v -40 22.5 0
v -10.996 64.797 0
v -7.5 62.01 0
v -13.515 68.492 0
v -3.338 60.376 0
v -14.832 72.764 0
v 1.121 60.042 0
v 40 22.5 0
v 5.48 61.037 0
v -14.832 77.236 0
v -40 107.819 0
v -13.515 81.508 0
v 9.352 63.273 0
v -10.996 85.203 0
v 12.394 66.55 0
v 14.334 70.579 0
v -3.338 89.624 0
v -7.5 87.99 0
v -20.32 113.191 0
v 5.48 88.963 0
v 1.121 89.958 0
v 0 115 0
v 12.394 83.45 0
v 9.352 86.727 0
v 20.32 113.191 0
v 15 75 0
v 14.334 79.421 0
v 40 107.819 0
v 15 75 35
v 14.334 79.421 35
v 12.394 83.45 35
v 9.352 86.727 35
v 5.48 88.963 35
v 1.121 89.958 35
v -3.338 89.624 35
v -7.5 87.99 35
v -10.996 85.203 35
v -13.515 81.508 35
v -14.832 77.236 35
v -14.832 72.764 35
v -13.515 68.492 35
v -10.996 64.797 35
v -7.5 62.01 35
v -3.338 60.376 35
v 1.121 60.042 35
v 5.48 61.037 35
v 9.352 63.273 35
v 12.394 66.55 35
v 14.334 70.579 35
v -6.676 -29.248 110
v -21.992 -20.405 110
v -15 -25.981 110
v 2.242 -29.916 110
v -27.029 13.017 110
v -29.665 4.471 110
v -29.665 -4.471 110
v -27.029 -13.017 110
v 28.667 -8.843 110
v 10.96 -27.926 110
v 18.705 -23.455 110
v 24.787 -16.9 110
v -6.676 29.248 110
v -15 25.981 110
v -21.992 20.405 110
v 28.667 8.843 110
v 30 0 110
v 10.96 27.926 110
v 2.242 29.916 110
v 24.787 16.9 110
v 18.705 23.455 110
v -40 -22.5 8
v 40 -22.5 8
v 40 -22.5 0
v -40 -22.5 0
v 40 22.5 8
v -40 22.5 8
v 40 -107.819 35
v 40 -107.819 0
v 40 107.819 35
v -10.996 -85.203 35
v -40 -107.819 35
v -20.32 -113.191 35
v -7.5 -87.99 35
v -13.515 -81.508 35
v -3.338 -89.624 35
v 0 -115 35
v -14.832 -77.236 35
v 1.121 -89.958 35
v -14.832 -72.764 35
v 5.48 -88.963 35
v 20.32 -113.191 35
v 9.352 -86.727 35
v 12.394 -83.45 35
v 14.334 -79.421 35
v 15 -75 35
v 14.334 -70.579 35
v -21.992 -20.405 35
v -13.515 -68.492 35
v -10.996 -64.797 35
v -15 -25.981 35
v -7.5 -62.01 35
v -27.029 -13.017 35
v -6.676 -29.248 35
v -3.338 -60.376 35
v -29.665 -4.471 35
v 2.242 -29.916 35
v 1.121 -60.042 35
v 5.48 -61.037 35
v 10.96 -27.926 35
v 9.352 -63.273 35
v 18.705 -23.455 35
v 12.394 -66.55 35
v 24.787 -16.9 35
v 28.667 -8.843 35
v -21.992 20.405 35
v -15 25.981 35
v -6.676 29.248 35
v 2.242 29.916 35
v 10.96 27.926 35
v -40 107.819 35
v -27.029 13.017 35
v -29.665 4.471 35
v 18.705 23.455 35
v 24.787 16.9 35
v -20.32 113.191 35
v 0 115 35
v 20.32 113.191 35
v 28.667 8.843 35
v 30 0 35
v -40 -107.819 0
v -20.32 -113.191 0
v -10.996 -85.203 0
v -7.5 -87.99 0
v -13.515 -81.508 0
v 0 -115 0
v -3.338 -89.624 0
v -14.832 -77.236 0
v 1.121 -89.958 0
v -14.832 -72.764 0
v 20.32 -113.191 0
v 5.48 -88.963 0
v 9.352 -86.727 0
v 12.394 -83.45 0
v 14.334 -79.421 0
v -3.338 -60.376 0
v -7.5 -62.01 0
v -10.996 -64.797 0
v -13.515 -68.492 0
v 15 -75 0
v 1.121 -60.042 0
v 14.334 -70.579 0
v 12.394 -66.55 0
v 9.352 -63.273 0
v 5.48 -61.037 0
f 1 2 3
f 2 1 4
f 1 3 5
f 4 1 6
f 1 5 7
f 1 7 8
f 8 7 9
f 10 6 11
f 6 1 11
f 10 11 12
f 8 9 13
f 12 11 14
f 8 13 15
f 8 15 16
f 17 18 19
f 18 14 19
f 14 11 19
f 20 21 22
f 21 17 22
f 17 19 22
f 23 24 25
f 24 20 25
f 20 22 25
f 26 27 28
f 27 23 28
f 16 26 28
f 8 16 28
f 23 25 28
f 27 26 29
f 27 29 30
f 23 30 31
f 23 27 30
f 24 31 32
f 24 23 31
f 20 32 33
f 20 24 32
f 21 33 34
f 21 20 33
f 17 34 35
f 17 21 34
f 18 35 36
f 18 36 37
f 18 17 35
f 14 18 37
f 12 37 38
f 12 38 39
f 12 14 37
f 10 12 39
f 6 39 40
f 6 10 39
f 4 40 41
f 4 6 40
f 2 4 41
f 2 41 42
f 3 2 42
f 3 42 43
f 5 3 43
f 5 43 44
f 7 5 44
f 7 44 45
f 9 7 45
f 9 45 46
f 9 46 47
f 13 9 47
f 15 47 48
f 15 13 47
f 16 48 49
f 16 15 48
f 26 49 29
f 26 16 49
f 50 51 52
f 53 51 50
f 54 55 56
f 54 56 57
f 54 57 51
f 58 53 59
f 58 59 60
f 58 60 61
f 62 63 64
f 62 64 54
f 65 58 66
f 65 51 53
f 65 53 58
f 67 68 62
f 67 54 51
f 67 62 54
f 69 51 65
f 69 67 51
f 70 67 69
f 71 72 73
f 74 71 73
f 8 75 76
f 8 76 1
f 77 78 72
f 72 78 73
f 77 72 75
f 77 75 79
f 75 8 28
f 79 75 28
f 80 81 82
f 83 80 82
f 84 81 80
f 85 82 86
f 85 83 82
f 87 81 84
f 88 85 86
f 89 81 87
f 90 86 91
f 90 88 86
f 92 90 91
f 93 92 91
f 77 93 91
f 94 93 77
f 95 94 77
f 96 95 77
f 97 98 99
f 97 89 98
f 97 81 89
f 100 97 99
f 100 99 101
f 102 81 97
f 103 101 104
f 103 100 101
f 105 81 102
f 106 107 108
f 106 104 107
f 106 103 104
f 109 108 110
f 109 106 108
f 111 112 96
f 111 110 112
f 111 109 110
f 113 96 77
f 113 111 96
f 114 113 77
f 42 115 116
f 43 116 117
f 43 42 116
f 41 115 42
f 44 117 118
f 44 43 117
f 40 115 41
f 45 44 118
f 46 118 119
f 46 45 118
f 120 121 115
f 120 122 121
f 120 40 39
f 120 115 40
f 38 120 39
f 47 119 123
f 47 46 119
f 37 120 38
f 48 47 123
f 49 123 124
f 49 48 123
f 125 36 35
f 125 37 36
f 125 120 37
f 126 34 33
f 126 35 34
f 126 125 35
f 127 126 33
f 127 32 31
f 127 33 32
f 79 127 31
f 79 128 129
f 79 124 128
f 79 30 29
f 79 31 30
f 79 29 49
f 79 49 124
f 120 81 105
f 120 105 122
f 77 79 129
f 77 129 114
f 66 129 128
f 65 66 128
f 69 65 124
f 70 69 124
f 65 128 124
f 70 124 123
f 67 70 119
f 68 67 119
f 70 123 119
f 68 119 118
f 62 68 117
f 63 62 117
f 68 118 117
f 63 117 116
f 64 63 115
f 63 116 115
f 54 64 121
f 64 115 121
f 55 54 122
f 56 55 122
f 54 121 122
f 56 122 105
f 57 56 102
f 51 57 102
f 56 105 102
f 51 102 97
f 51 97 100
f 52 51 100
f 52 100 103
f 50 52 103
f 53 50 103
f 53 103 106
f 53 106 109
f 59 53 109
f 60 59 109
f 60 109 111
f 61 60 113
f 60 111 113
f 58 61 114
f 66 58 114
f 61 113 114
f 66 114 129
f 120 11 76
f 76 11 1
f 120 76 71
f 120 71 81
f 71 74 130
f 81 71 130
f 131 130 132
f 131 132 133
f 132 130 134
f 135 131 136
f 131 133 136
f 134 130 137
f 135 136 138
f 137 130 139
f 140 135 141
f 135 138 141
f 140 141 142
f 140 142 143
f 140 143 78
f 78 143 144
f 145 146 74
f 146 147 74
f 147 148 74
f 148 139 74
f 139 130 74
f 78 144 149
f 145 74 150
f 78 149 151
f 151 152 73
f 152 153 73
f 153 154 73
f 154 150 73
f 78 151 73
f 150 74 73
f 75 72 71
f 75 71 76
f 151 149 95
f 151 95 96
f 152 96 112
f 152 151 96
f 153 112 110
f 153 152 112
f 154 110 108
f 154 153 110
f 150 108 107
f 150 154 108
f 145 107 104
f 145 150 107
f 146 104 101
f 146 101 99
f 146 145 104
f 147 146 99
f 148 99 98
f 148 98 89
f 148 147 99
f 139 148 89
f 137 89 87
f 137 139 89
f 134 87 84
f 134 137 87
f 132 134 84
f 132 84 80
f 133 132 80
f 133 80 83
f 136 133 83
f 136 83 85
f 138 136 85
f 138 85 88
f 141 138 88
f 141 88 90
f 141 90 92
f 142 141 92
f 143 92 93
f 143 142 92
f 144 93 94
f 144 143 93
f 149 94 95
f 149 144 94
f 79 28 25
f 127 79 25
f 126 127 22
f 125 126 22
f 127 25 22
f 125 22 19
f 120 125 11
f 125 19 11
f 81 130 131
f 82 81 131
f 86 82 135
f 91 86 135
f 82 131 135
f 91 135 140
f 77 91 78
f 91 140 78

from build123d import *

# Parameters (mm, degrees)
SKETCH1_R           = 15
BOSS_EXTRUDE1_DEPTH = 35
SKETCH3_W           = 8
SKETCH3_H           = 45
CUT_EXTRUDE1_DEPTH  = 115
SKETCH5_R           = 30
BOSS_EXTRUDE2_DEPTH = 75


with BuildPart() as part:
    # Sketch1 → Boss-Extrude1 (new body)
    with BuildSketch(Plane.XY):
        with BuildLine():
            Line((-40, 107.819293264), (-40, -107.819293264))
            ThreePointArc((-40, -107.819293264), (0, -115), (40, -107.819293264))
            Line((40, -107.819293264), (40, 107.819293264))
            ThreePointArc((40, 107.819293264), (0, 115), (-40, 107.819293264))
        make_face()
        with Locations((0, 75)):
            Circle(SKETCH1_R, mode=Mode.SUBTRACT)
        with Locations((0, -75)):
            Circle(SKETCH1_R, mode=Mode.SUBTRACT)
    extrude(amount=BOSS_EXTRUDE1_DEPTH)

    # Sketch3 → Cut-Extrude1 (cut)
    with BuildSketch(Plane(origin=(40, 0, 0), x_dir=(0, 0, -1), z_dir=(1, 0, 0))):
        with Locations((-4, 0)):
            Rectangle(SKETCH3_W, SKETCH3_H)
    extrude(amount=-CUT_EXTRUDE1_DEPTH, mode=Mode.SUBTRACT)

    # Sketch5 → Boss-Extrude2 (add)
    with BuildSketch(Plane.XY.offset(35)):
        Circle(SKETCH5_R)
    extrude(amount=BOSS_EXTRUDE2_DEPTH)


solid = part.part
